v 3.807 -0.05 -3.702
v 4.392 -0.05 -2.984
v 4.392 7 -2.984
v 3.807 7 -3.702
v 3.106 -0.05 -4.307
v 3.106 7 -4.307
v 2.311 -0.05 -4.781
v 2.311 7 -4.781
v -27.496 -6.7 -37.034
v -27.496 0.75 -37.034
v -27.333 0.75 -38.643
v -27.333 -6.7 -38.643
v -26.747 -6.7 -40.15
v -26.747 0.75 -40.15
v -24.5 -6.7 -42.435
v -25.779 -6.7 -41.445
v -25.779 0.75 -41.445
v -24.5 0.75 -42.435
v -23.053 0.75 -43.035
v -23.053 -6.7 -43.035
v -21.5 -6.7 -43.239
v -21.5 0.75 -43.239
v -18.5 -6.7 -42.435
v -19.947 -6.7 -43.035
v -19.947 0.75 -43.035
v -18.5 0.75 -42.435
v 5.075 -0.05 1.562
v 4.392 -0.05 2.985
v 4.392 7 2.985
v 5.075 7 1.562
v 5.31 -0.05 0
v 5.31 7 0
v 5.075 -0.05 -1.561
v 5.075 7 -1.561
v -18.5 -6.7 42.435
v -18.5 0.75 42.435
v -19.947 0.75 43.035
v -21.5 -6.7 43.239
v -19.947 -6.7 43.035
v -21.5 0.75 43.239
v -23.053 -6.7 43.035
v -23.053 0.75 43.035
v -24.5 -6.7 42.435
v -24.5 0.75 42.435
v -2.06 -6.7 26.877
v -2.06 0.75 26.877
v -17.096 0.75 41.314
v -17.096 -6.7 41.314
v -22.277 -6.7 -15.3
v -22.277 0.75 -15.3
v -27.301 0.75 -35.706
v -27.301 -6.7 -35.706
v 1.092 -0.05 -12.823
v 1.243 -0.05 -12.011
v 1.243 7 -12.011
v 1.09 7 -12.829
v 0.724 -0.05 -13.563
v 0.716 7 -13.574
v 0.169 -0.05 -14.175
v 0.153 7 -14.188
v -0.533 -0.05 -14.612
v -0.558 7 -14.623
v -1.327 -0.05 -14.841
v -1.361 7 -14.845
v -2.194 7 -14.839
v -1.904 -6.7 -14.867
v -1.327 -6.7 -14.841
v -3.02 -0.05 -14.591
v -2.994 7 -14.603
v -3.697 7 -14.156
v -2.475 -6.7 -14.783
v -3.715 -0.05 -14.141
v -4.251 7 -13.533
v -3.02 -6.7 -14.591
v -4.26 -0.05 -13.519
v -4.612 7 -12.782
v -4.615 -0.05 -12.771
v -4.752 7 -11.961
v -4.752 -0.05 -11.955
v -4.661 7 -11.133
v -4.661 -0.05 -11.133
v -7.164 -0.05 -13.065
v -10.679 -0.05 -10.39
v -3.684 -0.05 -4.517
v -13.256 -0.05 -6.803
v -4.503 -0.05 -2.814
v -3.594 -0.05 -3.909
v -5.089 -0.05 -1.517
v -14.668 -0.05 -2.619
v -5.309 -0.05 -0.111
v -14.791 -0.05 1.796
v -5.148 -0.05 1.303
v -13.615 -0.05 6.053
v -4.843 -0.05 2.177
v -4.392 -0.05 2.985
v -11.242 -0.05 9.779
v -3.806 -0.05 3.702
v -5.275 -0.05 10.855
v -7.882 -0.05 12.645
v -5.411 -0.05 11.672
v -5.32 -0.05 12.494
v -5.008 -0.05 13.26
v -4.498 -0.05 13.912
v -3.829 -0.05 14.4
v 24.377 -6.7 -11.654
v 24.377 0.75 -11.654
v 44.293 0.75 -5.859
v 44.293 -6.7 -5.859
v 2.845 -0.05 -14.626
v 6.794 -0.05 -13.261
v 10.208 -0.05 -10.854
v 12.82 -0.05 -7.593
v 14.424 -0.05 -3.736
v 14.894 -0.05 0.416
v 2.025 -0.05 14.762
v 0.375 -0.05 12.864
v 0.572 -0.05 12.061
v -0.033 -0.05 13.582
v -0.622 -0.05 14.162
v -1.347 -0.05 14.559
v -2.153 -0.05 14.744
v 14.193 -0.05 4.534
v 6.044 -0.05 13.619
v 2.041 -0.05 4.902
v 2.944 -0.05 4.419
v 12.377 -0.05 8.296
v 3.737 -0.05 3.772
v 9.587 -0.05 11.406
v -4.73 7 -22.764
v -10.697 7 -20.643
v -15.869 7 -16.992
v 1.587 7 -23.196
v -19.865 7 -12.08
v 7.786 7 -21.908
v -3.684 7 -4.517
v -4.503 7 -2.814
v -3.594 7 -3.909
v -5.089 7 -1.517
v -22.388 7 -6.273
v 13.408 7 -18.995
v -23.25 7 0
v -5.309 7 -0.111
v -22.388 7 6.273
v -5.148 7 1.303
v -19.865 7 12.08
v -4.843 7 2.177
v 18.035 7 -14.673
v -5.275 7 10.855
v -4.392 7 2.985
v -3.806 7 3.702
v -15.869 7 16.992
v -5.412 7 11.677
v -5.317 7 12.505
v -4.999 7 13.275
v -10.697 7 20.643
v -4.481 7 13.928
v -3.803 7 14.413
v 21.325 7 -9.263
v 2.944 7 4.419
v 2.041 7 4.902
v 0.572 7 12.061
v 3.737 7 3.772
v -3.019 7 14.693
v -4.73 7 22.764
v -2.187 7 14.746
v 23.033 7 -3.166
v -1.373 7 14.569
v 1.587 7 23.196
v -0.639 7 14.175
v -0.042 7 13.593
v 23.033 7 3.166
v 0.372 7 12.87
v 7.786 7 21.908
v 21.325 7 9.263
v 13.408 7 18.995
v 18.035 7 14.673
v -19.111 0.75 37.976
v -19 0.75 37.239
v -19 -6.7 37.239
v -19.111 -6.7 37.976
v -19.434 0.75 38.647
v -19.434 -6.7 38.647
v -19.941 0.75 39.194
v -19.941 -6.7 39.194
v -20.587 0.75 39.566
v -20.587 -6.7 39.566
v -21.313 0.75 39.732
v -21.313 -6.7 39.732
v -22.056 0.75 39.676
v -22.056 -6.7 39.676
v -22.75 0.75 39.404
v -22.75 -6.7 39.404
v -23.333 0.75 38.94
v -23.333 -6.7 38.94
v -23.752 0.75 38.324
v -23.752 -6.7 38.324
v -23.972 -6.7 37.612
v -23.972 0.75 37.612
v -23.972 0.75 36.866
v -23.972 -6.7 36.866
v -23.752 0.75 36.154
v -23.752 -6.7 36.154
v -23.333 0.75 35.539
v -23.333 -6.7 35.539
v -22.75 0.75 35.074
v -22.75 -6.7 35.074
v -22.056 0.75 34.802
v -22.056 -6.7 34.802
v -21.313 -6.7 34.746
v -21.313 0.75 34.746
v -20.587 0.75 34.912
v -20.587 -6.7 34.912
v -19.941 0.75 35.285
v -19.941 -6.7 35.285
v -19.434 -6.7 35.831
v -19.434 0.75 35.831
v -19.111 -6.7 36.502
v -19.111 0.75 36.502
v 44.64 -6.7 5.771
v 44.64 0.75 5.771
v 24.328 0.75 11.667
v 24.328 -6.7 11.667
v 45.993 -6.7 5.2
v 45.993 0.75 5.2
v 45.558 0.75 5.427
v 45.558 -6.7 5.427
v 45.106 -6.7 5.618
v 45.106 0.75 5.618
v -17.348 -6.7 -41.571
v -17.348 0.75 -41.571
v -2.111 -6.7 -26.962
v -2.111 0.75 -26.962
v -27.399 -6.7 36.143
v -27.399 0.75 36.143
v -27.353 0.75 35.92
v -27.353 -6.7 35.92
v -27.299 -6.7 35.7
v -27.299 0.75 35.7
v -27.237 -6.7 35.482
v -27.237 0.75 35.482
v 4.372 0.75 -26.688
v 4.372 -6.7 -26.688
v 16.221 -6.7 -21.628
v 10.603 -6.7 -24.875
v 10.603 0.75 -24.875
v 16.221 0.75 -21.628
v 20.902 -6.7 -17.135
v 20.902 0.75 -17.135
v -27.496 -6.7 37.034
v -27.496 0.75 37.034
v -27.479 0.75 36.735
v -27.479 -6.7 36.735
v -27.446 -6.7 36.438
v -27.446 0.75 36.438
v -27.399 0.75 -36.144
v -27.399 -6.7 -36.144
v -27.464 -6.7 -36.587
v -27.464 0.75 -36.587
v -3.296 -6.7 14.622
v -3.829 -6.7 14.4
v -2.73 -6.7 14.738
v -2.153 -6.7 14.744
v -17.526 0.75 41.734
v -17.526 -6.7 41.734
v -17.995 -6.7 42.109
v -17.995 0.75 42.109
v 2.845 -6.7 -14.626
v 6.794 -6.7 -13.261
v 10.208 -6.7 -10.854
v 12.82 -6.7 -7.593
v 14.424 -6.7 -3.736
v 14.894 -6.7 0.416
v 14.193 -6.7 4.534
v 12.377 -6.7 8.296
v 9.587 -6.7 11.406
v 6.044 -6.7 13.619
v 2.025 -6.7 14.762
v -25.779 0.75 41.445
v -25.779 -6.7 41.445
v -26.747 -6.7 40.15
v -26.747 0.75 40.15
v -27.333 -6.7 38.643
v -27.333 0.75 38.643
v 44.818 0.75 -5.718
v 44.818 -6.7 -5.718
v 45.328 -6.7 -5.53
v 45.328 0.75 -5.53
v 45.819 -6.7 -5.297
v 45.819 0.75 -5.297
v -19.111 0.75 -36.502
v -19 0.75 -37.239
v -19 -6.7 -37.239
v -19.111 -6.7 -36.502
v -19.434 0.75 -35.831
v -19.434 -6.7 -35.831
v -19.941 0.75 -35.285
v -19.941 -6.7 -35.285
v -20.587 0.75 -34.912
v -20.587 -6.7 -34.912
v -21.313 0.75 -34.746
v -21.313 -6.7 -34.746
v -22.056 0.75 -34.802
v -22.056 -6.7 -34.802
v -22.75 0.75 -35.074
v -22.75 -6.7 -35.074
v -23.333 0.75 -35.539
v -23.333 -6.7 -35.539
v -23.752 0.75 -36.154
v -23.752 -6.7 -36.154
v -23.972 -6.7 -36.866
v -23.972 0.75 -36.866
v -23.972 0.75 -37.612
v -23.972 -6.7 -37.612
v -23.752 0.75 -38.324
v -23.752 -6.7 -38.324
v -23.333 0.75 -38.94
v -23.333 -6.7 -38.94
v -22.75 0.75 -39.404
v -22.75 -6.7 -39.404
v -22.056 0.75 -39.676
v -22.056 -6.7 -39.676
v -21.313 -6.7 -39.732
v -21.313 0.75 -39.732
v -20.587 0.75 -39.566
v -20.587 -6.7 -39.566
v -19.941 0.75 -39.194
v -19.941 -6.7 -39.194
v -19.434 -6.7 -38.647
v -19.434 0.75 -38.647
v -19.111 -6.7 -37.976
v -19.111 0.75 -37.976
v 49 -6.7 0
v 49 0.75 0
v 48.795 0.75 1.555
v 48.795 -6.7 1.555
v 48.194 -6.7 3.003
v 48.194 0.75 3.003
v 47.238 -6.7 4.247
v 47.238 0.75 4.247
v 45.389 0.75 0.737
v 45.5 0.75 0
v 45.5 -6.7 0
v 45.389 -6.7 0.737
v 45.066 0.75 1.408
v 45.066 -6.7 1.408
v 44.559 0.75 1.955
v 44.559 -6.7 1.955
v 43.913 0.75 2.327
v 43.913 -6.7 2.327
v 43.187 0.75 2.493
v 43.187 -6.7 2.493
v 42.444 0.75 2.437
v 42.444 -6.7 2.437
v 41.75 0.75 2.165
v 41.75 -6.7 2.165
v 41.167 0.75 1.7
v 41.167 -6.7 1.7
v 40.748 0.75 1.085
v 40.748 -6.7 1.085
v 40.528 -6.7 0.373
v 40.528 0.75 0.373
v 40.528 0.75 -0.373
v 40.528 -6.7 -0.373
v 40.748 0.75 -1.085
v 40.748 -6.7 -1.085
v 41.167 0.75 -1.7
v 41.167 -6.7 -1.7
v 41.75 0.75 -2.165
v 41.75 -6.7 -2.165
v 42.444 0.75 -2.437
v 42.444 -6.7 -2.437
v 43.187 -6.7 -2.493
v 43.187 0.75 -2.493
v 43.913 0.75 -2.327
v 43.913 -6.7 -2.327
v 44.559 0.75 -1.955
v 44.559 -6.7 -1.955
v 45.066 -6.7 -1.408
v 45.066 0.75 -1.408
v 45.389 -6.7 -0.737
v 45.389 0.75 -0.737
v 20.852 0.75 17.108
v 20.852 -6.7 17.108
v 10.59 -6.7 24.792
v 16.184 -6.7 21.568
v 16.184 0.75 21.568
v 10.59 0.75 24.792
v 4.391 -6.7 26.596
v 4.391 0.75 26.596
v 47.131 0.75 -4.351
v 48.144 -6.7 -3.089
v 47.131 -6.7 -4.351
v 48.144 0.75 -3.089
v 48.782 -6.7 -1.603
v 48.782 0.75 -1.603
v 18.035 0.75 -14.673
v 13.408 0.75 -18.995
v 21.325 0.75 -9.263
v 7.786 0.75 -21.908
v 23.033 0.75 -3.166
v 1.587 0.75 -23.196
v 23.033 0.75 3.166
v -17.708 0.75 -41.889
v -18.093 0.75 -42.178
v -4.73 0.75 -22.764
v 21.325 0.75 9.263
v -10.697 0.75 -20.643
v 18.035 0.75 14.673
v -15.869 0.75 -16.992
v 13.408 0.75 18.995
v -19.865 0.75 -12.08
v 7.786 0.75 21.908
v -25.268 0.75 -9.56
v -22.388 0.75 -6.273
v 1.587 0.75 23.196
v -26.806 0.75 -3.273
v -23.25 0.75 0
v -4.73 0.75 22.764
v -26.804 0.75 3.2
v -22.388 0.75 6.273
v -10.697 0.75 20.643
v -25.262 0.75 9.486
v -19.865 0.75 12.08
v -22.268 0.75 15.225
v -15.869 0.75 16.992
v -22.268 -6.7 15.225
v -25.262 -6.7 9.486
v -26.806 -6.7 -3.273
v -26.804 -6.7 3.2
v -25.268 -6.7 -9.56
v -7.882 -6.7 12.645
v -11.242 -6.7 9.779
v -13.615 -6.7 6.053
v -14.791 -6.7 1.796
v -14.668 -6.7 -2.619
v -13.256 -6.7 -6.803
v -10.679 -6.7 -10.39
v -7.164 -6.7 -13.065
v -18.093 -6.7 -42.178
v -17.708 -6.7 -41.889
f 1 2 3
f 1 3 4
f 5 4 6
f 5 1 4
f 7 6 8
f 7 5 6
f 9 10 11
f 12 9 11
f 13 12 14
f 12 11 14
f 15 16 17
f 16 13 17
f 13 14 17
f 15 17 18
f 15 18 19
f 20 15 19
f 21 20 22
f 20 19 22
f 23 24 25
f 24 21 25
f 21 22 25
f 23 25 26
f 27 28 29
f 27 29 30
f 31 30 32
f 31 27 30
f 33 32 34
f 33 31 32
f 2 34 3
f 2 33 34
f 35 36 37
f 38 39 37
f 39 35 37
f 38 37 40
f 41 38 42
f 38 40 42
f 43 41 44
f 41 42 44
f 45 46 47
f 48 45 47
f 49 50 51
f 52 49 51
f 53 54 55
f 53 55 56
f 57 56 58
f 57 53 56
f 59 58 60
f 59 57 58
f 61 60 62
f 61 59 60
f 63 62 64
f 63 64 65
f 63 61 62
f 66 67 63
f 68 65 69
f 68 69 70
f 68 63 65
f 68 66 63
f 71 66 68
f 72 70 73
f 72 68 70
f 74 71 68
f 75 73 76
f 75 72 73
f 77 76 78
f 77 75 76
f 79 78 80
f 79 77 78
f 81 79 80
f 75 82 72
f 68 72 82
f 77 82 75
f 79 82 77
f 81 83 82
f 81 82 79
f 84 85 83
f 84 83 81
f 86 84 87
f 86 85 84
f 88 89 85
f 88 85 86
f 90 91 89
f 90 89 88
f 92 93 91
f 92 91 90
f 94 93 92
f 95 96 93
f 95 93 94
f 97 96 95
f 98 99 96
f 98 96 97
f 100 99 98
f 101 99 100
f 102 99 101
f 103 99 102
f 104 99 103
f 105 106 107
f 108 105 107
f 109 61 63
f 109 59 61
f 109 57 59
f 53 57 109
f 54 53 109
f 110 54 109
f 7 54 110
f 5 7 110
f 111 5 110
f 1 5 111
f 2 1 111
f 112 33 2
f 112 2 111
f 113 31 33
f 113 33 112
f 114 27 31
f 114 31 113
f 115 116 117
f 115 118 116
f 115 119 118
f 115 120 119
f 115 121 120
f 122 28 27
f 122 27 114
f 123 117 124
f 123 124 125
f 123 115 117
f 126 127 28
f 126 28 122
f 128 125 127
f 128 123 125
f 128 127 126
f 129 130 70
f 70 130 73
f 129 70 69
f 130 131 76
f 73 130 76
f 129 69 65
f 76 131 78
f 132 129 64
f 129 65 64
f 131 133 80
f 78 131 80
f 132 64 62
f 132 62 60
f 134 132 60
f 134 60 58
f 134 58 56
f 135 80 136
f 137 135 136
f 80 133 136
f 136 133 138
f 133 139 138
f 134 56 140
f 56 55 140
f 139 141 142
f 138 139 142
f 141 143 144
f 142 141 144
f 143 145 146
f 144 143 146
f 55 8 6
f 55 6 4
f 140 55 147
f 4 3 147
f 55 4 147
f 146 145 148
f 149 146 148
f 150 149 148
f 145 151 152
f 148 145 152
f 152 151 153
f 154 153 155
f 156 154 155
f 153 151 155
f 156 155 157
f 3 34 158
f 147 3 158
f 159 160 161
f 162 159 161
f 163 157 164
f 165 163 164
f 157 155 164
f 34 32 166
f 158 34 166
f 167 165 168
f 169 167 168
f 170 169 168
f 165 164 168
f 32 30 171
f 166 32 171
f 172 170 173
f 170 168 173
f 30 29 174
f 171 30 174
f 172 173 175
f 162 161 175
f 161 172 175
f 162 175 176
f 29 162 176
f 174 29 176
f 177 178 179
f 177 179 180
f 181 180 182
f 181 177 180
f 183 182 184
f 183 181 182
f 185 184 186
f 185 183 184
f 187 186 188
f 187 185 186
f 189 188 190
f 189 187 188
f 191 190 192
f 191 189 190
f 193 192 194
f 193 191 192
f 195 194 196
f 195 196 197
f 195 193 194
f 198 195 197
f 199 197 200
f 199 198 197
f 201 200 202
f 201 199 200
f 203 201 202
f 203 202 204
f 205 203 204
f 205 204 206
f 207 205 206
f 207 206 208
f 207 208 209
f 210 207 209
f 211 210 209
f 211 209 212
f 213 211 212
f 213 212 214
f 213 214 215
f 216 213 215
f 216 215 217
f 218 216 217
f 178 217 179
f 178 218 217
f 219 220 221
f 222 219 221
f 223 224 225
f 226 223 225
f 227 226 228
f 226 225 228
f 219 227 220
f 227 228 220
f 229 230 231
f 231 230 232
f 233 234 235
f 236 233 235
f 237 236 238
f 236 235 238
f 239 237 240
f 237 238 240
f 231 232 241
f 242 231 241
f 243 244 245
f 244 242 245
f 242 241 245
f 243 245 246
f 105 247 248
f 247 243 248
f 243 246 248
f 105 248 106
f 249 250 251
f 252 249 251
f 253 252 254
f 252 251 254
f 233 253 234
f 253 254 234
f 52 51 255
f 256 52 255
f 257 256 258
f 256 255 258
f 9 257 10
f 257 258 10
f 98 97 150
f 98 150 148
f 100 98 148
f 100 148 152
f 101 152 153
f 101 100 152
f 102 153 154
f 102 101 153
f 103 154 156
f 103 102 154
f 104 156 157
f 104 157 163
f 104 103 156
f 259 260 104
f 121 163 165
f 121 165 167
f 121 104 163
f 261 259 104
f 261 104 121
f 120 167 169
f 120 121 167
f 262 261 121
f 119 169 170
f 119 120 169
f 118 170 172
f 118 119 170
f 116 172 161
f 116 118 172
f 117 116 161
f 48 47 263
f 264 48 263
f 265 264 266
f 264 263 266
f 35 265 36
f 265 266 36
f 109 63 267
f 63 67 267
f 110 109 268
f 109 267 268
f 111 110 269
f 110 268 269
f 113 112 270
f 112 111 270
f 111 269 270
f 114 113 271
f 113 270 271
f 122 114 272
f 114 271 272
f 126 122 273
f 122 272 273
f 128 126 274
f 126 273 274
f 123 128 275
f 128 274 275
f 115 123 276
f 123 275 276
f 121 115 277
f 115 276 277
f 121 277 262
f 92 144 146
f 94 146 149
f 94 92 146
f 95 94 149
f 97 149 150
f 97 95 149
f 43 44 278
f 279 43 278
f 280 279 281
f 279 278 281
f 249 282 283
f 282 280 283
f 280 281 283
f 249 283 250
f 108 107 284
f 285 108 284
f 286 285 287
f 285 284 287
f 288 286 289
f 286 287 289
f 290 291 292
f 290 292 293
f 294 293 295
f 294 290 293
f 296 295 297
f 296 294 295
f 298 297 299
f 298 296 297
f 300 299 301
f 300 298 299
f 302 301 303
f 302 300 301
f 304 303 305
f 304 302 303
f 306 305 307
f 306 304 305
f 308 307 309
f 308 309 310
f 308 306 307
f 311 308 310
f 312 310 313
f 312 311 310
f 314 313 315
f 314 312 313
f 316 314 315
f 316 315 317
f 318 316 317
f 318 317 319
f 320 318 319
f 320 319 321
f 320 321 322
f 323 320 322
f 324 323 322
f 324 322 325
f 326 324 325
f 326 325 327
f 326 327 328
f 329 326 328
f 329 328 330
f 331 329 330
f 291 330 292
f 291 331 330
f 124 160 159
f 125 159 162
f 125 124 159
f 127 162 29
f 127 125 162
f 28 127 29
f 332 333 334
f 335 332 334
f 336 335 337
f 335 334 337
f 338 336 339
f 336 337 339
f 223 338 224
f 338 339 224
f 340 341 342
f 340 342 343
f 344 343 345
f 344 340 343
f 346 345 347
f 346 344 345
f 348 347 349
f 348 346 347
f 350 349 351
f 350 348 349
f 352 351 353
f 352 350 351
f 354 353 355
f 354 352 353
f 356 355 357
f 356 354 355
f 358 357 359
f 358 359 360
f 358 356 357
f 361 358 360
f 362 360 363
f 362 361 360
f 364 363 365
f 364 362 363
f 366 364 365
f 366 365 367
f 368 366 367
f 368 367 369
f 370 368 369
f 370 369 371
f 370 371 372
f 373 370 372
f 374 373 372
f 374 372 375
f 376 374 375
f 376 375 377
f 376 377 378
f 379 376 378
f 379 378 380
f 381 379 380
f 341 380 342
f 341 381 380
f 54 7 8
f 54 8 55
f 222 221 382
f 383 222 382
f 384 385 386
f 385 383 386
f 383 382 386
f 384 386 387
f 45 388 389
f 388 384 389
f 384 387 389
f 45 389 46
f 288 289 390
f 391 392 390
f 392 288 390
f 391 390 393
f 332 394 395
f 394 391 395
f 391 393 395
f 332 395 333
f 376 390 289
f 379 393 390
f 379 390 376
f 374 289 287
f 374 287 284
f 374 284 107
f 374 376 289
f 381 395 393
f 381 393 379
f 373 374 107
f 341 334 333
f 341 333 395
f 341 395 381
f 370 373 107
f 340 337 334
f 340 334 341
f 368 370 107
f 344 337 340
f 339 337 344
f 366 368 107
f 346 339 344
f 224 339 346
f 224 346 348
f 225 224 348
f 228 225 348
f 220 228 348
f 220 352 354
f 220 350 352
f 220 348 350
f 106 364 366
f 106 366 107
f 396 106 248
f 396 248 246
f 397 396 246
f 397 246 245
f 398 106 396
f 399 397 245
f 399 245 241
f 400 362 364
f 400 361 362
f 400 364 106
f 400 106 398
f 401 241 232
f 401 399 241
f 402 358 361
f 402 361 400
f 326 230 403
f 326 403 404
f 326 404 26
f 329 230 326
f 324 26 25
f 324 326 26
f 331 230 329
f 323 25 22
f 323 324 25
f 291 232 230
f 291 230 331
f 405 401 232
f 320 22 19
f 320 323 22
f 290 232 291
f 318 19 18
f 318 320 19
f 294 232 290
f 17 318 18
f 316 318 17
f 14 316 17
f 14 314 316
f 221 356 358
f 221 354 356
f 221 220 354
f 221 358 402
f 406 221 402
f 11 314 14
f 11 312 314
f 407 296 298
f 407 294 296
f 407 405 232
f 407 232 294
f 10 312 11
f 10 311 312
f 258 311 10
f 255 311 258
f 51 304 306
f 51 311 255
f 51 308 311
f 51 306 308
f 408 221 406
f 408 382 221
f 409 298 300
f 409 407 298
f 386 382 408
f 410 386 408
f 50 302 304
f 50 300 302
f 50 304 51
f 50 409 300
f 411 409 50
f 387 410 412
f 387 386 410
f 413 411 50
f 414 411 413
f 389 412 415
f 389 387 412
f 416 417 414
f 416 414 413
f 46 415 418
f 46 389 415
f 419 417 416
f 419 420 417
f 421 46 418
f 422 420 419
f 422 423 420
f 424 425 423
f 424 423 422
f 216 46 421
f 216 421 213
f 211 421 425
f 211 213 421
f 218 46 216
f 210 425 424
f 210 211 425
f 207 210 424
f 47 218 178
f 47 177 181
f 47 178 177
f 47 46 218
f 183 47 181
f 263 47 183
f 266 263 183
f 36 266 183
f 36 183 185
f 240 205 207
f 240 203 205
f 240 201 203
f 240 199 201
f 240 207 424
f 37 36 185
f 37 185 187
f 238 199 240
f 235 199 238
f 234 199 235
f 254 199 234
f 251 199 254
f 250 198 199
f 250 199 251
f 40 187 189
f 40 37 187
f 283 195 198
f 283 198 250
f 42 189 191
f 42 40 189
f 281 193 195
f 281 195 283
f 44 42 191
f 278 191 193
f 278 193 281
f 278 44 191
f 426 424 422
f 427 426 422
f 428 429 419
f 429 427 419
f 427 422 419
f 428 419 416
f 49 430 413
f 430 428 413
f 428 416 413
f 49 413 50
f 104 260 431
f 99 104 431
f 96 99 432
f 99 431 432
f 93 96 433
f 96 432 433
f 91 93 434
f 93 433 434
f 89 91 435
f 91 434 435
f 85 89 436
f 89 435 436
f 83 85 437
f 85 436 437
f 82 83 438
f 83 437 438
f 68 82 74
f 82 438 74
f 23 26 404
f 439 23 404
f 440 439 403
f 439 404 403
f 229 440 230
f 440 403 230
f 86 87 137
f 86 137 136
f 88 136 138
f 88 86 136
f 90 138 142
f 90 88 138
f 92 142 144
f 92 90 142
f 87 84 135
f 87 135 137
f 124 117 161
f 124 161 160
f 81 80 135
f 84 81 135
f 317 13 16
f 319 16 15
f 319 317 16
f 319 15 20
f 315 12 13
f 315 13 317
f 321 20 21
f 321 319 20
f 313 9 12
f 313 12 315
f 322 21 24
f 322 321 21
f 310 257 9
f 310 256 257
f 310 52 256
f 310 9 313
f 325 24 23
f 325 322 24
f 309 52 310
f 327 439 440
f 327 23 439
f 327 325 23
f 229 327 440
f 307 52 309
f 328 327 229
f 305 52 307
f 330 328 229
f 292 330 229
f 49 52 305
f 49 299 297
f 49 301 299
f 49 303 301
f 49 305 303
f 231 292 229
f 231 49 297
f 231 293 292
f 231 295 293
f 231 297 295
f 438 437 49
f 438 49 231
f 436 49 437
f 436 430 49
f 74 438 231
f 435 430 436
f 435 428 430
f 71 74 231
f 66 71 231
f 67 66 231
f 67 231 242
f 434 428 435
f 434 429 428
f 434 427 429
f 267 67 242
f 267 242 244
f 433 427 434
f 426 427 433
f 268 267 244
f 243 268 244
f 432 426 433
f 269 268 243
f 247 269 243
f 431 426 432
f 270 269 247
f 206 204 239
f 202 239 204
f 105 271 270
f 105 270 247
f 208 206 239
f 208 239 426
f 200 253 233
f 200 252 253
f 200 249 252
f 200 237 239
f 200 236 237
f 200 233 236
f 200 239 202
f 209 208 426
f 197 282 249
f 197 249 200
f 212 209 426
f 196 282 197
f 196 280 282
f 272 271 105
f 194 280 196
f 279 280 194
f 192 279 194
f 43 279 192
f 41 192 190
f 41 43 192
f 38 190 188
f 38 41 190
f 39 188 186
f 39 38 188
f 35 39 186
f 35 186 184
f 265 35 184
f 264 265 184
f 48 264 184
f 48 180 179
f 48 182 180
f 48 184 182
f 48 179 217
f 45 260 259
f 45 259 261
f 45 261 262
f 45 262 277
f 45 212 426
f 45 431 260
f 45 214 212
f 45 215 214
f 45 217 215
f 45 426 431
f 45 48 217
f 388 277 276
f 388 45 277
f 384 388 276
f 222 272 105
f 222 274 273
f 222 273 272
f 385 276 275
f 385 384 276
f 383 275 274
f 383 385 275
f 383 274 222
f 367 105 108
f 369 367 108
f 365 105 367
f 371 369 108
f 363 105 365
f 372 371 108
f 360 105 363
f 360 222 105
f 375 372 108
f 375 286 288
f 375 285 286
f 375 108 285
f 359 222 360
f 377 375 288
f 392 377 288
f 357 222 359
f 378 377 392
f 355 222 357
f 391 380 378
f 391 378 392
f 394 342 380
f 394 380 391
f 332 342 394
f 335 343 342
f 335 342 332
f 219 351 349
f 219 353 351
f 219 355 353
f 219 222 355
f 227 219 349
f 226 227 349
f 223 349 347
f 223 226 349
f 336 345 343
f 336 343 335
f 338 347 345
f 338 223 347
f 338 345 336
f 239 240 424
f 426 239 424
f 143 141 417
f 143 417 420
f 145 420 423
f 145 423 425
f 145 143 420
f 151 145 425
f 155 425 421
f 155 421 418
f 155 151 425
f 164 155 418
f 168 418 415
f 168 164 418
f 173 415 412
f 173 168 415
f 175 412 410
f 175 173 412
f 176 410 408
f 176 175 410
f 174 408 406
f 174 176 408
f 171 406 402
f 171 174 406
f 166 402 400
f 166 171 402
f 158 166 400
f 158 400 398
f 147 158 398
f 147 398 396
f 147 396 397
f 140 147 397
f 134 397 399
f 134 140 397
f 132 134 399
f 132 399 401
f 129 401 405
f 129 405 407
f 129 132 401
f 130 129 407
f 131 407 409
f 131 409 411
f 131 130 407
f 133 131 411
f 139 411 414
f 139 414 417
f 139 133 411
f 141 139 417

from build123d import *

# Parameters (mm, degrees)
F0_R          = 49
F0_R_2        = 2.5
F1_DEPTH      = 6.7
F1_DEPTH_BACK = 7
F2_R          = 57.85
F2_R_2        = 55.35
F3_DEPTH      = 3
F4_R          = 14.9
F5_DEPTH      = 6.65
F7_DEPTH      = 30.3
F8_R          = 57.307814
F8_R_2        = 23.25
F9_DEPTH      = 6.25


with BuildPart() as f1:
    # F0 (on Front) → F1 (new body, two sides)
    with BuildSketch(Plane.XZ) as f1_sk:
        Circle(F0_R)
        with Locations((-21.5, -37.239092)):
            Circle(F0_R_2, mode=Mode.SUBTRACT)
        with BuildLine():
            ThreePointArc((2.041061, 4.902058), (3.356125, 4.114915), (4.391594, 2.984962))
            ThreePointArc((4.391594, 2.984962), (5.31, 0.000354), (4.391992, -2.984377))
            ThreePointArc((4.391992, -2.984377), (3.469883, -4.019454), (2.311288, -4.780591))
            Line((2.311288, -4.780591), (1.24348, -12.010569))
            ThreePointArc((1.24348, -12.010569), (-2.194471, -14.838607), (-4.660959, -11.132702))
            Line((-4.660959, -11.132702), (-3.683832, -4.516713))
            Line((-3.683832, -4.516713), (-3.594051, -3.908823))
            ThreePointArc((-3.594051, -3.908823), (-5.088714, -1.516936), (-5.147666, 1.302933))
            ThreePointArc((-5.147666, 1.302933), (-4.635012, 2.5909), (-3.806465, 3.702286))
            Line((-3.806465, 3.702286), (-5.274612, 10.855416))
            ThreePointArc((-5.274612, 10.855416), (-3.018653, 14.693117), (0.571674, 12.061227))
            Line((0.571674, 12.061227), (2.041061, 4.902058))
        make_face(mode=Mode.SUBTRACT)
        with Locations((43, 0)):
            Circle(F0_R_2, mode=Mode.SUBTRACT)
        with Locations((-21.5, 37.239092)):
            Circle(F0_R_2, mode=Mode.SUBTRACT)
    extrude(amount=F1_DEPTH)
    extrude(f1_sk.sketch, amount=-F1_DEPTH_BACK)

    # F2 (on face) → F3 (cut)
    with BuildSketch(Plane(origin=(0, 7, 0), x_dir=(-1, 0, 0), z_dir=(0, 1, 0))):
        Circle(F2_R)
        Circle(F2_R_2, mode=Mode.SUBTRACT)
    extrude(amount=-F3_DEPTH, mode=Mode.SUBTRACT)

    # F4 (on face) → F5 (cut)
    with BuildSketch(Plane.XZ.offset(6.7)):
        Circle(F4_R)
    extrude(amount=-F5_DEPTH, mode=Mode.SUBTRACT)

    # F6 (on face) → F7 (cut)
    with BuildSketch(Plane(origin=(0, 7, 0), x_dir=(-1, 0, 0), z_dir=(0, 1, 0))):
        with BuildLine():
            ThreePointArc((-49, 0), (-48.194169, 3.003433), (-45.99313, 5.200113))
            ThreePointArc((-45.99313, 5.200113), (-45.334188, 5.527347), (-44.64015, 5.771474))
            Line((-44.64015, 5.771474), (-24.327876, 11.667113))
            ThreePointArc((-24.327876, 11.667113), (-13.483488, 23.348029), (2.059675, 26.877142))
            Line((2.059675, 26.877142), (17.096325, 41.31434))
            ThreePointArc((17.096325, 41.31434), (17.755977, 41.92762), (18.5, 42.435245))
            ThreePointArc((18.5, 42.435245), (21.5, 43.239092), (24.5, 42.435245))
            ThreePointArc((24.5, 42.435245), (-24.5, 42.435245), (-49, 0))
        make_face()
        with BuildLine():
            ThreePointArc((49, 0), (42.435245, 24.5), (24.5, 42.435245))
            ThreePointArc((24.5, 42.435245), (26.746667, 40.149845), (27.496495, 37.034027))
            ThreePointArc((27.496495, 37.034027), (27.464398, 36.586443), (27.398941, 36.14251))
            ThreePointArc((27.398941, 36.14251), (27.327257, 35.809732), (27.236816, 35.481554))
            Line((27.236816, 35.481554), (22.268012, 15.224597))
            ThreePointArc((22.268012, 15.224597), (26.999999, -0.036464), (22.276739, -15.300227))
            Line((22.276739, -15.300227), (27.300915, -35.706322))
            ThreePointArc((27.300915, -35.706322), (27.435943, -36.364689), (27.496495, -37.034027))
            ThreePointArc((27.496495, -37.034027), (26.746667, -40.149845), (24.5, -42.435245))
            ThreePointArc((24.5, -42.435245), (42.435245, -24.5), (49, 0))
        make_face()
        with BuildLine():
            ThreePointArc((-45.818674, -5.296704), (-48.143542, -3.089333), (-49, 0))
            ThreePointArc((-49, 0), (-24.5, -42.435245), (24.5, -42.435245))
            ThreePointArc((24.5, -42.435245), (21.499855, -43.239092), (18.499749, -42.4351))
            ThreePointArc((18.499749, -42.4351), (17.89788, -42.037502), (17.348075, -41.570549))
            Line((17.348075, -41.570549), (2.111401, -26.9615))
            ThreePointArc((2.111401, -26.9615), (-13.509794, -23.421212), (-24.376516, -11.653896))
            Line((-24.376516, -11.653896), (-44.293281, -5.858961))
            ThreePointArc((-44.293281, -5.858961), (-45.075108, -5.629736), (-45.818674, -5.296704))
        make_face()
    extrude(amount=-F7_DEPTH, mode=Mode.SUBTRACT)

    # F8 (on face) → F9 (cut)
    with BuildSketch(Plane(origin=(0, 7, 0), x_dir=(-1, 0, 0), z_dir=(0, 1, 0))):
        Circle(F8_R)
        Circle(F8_R_2, mode=Mode.SUBTRACT)
    extrude(amount=-F9_DEPTH, mode=Mode.SUBTRACT)


solid = f1.part
